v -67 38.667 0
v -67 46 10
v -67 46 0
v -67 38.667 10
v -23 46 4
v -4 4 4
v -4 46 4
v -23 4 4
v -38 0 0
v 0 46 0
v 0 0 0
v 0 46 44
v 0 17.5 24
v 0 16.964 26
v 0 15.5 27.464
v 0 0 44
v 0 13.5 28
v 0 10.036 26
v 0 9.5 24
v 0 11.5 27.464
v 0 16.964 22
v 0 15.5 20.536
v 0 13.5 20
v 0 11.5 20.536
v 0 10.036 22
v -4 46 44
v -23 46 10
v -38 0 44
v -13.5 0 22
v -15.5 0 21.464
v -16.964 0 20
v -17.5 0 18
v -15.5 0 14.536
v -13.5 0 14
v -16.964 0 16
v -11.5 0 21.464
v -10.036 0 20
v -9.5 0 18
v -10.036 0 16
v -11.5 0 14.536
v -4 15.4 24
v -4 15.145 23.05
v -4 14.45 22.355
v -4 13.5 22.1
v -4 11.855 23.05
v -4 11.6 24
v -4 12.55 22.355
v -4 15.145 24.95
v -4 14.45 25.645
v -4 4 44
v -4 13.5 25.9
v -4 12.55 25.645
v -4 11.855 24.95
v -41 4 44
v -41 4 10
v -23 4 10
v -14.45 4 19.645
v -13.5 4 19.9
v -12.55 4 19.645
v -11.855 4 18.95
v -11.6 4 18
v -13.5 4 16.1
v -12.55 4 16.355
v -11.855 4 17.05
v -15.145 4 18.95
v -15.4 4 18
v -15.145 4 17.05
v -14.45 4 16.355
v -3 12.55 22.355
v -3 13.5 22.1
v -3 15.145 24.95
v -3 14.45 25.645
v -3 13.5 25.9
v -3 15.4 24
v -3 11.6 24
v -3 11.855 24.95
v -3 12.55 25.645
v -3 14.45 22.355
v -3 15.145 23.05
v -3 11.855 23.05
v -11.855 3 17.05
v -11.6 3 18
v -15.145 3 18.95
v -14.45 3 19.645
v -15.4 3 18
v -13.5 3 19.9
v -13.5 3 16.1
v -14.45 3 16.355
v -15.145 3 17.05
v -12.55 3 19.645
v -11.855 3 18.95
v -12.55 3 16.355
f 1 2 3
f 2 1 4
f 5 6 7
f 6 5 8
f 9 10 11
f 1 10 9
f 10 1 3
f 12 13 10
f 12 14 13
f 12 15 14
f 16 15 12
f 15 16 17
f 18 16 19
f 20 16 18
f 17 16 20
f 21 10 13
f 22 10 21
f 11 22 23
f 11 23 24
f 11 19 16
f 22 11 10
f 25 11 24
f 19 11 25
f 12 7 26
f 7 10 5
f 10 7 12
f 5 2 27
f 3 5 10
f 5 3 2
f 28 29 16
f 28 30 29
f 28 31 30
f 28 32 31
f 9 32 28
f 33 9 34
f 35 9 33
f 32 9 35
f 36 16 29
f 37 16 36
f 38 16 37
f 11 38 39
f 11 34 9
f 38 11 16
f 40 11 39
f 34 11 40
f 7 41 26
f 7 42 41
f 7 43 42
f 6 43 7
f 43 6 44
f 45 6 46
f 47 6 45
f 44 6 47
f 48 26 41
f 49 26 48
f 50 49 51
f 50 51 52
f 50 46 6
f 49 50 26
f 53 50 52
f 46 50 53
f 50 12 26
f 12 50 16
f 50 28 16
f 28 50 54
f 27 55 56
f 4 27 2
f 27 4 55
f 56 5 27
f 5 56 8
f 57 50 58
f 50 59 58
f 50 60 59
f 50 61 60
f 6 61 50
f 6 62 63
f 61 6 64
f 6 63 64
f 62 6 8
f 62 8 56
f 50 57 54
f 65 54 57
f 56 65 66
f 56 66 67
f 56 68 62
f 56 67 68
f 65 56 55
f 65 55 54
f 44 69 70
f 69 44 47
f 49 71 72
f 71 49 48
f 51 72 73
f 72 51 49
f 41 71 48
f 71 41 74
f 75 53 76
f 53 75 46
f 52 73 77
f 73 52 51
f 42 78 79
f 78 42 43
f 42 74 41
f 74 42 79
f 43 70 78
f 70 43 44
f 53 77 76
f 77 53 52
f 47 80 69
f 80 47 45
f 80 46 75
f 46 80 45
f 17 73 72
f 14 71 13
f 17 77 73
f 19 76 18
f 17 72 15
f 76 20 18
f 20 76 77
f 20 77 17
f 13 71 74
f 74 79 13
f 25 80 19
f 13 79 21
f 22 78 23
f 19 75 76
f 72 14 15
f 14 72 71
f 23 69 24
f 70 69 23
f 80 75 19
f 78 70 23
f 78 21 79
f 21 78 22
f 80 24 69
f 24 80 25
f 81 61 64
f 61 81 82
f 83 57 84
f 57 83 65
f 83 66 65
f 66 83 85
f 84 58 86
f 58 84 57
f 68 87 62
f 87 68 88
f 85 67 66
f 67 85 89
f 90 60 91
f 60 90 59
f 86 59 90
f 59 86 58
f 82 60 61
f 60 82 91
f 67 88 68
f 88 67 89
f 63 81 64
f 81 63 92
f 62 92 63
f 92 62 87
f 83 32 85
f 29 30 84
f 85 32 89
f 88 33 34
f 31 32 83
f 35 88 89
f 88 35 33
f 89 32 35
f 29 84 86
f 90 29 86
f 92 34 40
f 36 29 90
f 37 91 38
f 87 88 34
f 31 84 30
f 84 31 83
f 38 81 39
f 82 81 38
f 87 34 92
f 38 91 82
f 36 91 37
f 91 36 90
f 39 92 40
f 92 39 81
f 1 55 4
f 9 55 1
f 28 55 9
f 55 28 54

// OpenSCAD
difference(){
	scale(v = [-1, 1, 1]) {
		union() {
			cube(size = [67, 46, 4]);
			translate(v = [0, 0, 4]) {
				cube(size = [4, 46, 40]);
			}
			translate(v = [23, 0, 4]) {
				cube(size = [44, 46, 6]);
			}
			translate(v = [0, 0, 4]) {
				cube(size = [67, 4, 40]);
			}
		}
	}
	/* Holes Below*/
	scale(v = [-1, 1, 1]){
		union(){
			translate(v = [41, 4, 0]) {
				rotate(a = -36.8700000000, v = [0, 0, 1]) {
					translate(v = [0, -10, 0]) {
						cube(size = [50, 60, 50]);
					}
				}
			}
			translate(v = [0, 13.5000000000, 24.0000000000]) {
				rotate(a = -90, v = [0, 1, 0]) {
					union() {
						union() {
							translate(v = [0, 0, -5]) {
								cylinder($fn = 12, h = 5, r = 1.9000000000);
							}
							translate(v = [0, 0, -3]) {
								cylinder($fn = 12, h = 3, r1 = 1.9000000000, r2 = 4);
							}
						}
						cylinder($fn = 12, h = 1, r = 4);
					}
				}
			}
			translate(v = [13.5000000000, 0, 18.0000000000]) {
				rotate(a = 90, v = [1, 0, 0]) {
					union() {
						union() {
							translate(v = [0, 0, -5]) {
								cylinder($fn = 12, h = 5, r = 1.9000000000);
							}
							translate(v = [0, 0, -3]) {
								cylinder($fn = 12, h = 3, r1 = 1.9000000000, r2 = 4);
							}
						}
						cylinder($fn = 12, h = 1, r = 4);
					}
				}
			}
		}
	} /* End Holes */ 
}
